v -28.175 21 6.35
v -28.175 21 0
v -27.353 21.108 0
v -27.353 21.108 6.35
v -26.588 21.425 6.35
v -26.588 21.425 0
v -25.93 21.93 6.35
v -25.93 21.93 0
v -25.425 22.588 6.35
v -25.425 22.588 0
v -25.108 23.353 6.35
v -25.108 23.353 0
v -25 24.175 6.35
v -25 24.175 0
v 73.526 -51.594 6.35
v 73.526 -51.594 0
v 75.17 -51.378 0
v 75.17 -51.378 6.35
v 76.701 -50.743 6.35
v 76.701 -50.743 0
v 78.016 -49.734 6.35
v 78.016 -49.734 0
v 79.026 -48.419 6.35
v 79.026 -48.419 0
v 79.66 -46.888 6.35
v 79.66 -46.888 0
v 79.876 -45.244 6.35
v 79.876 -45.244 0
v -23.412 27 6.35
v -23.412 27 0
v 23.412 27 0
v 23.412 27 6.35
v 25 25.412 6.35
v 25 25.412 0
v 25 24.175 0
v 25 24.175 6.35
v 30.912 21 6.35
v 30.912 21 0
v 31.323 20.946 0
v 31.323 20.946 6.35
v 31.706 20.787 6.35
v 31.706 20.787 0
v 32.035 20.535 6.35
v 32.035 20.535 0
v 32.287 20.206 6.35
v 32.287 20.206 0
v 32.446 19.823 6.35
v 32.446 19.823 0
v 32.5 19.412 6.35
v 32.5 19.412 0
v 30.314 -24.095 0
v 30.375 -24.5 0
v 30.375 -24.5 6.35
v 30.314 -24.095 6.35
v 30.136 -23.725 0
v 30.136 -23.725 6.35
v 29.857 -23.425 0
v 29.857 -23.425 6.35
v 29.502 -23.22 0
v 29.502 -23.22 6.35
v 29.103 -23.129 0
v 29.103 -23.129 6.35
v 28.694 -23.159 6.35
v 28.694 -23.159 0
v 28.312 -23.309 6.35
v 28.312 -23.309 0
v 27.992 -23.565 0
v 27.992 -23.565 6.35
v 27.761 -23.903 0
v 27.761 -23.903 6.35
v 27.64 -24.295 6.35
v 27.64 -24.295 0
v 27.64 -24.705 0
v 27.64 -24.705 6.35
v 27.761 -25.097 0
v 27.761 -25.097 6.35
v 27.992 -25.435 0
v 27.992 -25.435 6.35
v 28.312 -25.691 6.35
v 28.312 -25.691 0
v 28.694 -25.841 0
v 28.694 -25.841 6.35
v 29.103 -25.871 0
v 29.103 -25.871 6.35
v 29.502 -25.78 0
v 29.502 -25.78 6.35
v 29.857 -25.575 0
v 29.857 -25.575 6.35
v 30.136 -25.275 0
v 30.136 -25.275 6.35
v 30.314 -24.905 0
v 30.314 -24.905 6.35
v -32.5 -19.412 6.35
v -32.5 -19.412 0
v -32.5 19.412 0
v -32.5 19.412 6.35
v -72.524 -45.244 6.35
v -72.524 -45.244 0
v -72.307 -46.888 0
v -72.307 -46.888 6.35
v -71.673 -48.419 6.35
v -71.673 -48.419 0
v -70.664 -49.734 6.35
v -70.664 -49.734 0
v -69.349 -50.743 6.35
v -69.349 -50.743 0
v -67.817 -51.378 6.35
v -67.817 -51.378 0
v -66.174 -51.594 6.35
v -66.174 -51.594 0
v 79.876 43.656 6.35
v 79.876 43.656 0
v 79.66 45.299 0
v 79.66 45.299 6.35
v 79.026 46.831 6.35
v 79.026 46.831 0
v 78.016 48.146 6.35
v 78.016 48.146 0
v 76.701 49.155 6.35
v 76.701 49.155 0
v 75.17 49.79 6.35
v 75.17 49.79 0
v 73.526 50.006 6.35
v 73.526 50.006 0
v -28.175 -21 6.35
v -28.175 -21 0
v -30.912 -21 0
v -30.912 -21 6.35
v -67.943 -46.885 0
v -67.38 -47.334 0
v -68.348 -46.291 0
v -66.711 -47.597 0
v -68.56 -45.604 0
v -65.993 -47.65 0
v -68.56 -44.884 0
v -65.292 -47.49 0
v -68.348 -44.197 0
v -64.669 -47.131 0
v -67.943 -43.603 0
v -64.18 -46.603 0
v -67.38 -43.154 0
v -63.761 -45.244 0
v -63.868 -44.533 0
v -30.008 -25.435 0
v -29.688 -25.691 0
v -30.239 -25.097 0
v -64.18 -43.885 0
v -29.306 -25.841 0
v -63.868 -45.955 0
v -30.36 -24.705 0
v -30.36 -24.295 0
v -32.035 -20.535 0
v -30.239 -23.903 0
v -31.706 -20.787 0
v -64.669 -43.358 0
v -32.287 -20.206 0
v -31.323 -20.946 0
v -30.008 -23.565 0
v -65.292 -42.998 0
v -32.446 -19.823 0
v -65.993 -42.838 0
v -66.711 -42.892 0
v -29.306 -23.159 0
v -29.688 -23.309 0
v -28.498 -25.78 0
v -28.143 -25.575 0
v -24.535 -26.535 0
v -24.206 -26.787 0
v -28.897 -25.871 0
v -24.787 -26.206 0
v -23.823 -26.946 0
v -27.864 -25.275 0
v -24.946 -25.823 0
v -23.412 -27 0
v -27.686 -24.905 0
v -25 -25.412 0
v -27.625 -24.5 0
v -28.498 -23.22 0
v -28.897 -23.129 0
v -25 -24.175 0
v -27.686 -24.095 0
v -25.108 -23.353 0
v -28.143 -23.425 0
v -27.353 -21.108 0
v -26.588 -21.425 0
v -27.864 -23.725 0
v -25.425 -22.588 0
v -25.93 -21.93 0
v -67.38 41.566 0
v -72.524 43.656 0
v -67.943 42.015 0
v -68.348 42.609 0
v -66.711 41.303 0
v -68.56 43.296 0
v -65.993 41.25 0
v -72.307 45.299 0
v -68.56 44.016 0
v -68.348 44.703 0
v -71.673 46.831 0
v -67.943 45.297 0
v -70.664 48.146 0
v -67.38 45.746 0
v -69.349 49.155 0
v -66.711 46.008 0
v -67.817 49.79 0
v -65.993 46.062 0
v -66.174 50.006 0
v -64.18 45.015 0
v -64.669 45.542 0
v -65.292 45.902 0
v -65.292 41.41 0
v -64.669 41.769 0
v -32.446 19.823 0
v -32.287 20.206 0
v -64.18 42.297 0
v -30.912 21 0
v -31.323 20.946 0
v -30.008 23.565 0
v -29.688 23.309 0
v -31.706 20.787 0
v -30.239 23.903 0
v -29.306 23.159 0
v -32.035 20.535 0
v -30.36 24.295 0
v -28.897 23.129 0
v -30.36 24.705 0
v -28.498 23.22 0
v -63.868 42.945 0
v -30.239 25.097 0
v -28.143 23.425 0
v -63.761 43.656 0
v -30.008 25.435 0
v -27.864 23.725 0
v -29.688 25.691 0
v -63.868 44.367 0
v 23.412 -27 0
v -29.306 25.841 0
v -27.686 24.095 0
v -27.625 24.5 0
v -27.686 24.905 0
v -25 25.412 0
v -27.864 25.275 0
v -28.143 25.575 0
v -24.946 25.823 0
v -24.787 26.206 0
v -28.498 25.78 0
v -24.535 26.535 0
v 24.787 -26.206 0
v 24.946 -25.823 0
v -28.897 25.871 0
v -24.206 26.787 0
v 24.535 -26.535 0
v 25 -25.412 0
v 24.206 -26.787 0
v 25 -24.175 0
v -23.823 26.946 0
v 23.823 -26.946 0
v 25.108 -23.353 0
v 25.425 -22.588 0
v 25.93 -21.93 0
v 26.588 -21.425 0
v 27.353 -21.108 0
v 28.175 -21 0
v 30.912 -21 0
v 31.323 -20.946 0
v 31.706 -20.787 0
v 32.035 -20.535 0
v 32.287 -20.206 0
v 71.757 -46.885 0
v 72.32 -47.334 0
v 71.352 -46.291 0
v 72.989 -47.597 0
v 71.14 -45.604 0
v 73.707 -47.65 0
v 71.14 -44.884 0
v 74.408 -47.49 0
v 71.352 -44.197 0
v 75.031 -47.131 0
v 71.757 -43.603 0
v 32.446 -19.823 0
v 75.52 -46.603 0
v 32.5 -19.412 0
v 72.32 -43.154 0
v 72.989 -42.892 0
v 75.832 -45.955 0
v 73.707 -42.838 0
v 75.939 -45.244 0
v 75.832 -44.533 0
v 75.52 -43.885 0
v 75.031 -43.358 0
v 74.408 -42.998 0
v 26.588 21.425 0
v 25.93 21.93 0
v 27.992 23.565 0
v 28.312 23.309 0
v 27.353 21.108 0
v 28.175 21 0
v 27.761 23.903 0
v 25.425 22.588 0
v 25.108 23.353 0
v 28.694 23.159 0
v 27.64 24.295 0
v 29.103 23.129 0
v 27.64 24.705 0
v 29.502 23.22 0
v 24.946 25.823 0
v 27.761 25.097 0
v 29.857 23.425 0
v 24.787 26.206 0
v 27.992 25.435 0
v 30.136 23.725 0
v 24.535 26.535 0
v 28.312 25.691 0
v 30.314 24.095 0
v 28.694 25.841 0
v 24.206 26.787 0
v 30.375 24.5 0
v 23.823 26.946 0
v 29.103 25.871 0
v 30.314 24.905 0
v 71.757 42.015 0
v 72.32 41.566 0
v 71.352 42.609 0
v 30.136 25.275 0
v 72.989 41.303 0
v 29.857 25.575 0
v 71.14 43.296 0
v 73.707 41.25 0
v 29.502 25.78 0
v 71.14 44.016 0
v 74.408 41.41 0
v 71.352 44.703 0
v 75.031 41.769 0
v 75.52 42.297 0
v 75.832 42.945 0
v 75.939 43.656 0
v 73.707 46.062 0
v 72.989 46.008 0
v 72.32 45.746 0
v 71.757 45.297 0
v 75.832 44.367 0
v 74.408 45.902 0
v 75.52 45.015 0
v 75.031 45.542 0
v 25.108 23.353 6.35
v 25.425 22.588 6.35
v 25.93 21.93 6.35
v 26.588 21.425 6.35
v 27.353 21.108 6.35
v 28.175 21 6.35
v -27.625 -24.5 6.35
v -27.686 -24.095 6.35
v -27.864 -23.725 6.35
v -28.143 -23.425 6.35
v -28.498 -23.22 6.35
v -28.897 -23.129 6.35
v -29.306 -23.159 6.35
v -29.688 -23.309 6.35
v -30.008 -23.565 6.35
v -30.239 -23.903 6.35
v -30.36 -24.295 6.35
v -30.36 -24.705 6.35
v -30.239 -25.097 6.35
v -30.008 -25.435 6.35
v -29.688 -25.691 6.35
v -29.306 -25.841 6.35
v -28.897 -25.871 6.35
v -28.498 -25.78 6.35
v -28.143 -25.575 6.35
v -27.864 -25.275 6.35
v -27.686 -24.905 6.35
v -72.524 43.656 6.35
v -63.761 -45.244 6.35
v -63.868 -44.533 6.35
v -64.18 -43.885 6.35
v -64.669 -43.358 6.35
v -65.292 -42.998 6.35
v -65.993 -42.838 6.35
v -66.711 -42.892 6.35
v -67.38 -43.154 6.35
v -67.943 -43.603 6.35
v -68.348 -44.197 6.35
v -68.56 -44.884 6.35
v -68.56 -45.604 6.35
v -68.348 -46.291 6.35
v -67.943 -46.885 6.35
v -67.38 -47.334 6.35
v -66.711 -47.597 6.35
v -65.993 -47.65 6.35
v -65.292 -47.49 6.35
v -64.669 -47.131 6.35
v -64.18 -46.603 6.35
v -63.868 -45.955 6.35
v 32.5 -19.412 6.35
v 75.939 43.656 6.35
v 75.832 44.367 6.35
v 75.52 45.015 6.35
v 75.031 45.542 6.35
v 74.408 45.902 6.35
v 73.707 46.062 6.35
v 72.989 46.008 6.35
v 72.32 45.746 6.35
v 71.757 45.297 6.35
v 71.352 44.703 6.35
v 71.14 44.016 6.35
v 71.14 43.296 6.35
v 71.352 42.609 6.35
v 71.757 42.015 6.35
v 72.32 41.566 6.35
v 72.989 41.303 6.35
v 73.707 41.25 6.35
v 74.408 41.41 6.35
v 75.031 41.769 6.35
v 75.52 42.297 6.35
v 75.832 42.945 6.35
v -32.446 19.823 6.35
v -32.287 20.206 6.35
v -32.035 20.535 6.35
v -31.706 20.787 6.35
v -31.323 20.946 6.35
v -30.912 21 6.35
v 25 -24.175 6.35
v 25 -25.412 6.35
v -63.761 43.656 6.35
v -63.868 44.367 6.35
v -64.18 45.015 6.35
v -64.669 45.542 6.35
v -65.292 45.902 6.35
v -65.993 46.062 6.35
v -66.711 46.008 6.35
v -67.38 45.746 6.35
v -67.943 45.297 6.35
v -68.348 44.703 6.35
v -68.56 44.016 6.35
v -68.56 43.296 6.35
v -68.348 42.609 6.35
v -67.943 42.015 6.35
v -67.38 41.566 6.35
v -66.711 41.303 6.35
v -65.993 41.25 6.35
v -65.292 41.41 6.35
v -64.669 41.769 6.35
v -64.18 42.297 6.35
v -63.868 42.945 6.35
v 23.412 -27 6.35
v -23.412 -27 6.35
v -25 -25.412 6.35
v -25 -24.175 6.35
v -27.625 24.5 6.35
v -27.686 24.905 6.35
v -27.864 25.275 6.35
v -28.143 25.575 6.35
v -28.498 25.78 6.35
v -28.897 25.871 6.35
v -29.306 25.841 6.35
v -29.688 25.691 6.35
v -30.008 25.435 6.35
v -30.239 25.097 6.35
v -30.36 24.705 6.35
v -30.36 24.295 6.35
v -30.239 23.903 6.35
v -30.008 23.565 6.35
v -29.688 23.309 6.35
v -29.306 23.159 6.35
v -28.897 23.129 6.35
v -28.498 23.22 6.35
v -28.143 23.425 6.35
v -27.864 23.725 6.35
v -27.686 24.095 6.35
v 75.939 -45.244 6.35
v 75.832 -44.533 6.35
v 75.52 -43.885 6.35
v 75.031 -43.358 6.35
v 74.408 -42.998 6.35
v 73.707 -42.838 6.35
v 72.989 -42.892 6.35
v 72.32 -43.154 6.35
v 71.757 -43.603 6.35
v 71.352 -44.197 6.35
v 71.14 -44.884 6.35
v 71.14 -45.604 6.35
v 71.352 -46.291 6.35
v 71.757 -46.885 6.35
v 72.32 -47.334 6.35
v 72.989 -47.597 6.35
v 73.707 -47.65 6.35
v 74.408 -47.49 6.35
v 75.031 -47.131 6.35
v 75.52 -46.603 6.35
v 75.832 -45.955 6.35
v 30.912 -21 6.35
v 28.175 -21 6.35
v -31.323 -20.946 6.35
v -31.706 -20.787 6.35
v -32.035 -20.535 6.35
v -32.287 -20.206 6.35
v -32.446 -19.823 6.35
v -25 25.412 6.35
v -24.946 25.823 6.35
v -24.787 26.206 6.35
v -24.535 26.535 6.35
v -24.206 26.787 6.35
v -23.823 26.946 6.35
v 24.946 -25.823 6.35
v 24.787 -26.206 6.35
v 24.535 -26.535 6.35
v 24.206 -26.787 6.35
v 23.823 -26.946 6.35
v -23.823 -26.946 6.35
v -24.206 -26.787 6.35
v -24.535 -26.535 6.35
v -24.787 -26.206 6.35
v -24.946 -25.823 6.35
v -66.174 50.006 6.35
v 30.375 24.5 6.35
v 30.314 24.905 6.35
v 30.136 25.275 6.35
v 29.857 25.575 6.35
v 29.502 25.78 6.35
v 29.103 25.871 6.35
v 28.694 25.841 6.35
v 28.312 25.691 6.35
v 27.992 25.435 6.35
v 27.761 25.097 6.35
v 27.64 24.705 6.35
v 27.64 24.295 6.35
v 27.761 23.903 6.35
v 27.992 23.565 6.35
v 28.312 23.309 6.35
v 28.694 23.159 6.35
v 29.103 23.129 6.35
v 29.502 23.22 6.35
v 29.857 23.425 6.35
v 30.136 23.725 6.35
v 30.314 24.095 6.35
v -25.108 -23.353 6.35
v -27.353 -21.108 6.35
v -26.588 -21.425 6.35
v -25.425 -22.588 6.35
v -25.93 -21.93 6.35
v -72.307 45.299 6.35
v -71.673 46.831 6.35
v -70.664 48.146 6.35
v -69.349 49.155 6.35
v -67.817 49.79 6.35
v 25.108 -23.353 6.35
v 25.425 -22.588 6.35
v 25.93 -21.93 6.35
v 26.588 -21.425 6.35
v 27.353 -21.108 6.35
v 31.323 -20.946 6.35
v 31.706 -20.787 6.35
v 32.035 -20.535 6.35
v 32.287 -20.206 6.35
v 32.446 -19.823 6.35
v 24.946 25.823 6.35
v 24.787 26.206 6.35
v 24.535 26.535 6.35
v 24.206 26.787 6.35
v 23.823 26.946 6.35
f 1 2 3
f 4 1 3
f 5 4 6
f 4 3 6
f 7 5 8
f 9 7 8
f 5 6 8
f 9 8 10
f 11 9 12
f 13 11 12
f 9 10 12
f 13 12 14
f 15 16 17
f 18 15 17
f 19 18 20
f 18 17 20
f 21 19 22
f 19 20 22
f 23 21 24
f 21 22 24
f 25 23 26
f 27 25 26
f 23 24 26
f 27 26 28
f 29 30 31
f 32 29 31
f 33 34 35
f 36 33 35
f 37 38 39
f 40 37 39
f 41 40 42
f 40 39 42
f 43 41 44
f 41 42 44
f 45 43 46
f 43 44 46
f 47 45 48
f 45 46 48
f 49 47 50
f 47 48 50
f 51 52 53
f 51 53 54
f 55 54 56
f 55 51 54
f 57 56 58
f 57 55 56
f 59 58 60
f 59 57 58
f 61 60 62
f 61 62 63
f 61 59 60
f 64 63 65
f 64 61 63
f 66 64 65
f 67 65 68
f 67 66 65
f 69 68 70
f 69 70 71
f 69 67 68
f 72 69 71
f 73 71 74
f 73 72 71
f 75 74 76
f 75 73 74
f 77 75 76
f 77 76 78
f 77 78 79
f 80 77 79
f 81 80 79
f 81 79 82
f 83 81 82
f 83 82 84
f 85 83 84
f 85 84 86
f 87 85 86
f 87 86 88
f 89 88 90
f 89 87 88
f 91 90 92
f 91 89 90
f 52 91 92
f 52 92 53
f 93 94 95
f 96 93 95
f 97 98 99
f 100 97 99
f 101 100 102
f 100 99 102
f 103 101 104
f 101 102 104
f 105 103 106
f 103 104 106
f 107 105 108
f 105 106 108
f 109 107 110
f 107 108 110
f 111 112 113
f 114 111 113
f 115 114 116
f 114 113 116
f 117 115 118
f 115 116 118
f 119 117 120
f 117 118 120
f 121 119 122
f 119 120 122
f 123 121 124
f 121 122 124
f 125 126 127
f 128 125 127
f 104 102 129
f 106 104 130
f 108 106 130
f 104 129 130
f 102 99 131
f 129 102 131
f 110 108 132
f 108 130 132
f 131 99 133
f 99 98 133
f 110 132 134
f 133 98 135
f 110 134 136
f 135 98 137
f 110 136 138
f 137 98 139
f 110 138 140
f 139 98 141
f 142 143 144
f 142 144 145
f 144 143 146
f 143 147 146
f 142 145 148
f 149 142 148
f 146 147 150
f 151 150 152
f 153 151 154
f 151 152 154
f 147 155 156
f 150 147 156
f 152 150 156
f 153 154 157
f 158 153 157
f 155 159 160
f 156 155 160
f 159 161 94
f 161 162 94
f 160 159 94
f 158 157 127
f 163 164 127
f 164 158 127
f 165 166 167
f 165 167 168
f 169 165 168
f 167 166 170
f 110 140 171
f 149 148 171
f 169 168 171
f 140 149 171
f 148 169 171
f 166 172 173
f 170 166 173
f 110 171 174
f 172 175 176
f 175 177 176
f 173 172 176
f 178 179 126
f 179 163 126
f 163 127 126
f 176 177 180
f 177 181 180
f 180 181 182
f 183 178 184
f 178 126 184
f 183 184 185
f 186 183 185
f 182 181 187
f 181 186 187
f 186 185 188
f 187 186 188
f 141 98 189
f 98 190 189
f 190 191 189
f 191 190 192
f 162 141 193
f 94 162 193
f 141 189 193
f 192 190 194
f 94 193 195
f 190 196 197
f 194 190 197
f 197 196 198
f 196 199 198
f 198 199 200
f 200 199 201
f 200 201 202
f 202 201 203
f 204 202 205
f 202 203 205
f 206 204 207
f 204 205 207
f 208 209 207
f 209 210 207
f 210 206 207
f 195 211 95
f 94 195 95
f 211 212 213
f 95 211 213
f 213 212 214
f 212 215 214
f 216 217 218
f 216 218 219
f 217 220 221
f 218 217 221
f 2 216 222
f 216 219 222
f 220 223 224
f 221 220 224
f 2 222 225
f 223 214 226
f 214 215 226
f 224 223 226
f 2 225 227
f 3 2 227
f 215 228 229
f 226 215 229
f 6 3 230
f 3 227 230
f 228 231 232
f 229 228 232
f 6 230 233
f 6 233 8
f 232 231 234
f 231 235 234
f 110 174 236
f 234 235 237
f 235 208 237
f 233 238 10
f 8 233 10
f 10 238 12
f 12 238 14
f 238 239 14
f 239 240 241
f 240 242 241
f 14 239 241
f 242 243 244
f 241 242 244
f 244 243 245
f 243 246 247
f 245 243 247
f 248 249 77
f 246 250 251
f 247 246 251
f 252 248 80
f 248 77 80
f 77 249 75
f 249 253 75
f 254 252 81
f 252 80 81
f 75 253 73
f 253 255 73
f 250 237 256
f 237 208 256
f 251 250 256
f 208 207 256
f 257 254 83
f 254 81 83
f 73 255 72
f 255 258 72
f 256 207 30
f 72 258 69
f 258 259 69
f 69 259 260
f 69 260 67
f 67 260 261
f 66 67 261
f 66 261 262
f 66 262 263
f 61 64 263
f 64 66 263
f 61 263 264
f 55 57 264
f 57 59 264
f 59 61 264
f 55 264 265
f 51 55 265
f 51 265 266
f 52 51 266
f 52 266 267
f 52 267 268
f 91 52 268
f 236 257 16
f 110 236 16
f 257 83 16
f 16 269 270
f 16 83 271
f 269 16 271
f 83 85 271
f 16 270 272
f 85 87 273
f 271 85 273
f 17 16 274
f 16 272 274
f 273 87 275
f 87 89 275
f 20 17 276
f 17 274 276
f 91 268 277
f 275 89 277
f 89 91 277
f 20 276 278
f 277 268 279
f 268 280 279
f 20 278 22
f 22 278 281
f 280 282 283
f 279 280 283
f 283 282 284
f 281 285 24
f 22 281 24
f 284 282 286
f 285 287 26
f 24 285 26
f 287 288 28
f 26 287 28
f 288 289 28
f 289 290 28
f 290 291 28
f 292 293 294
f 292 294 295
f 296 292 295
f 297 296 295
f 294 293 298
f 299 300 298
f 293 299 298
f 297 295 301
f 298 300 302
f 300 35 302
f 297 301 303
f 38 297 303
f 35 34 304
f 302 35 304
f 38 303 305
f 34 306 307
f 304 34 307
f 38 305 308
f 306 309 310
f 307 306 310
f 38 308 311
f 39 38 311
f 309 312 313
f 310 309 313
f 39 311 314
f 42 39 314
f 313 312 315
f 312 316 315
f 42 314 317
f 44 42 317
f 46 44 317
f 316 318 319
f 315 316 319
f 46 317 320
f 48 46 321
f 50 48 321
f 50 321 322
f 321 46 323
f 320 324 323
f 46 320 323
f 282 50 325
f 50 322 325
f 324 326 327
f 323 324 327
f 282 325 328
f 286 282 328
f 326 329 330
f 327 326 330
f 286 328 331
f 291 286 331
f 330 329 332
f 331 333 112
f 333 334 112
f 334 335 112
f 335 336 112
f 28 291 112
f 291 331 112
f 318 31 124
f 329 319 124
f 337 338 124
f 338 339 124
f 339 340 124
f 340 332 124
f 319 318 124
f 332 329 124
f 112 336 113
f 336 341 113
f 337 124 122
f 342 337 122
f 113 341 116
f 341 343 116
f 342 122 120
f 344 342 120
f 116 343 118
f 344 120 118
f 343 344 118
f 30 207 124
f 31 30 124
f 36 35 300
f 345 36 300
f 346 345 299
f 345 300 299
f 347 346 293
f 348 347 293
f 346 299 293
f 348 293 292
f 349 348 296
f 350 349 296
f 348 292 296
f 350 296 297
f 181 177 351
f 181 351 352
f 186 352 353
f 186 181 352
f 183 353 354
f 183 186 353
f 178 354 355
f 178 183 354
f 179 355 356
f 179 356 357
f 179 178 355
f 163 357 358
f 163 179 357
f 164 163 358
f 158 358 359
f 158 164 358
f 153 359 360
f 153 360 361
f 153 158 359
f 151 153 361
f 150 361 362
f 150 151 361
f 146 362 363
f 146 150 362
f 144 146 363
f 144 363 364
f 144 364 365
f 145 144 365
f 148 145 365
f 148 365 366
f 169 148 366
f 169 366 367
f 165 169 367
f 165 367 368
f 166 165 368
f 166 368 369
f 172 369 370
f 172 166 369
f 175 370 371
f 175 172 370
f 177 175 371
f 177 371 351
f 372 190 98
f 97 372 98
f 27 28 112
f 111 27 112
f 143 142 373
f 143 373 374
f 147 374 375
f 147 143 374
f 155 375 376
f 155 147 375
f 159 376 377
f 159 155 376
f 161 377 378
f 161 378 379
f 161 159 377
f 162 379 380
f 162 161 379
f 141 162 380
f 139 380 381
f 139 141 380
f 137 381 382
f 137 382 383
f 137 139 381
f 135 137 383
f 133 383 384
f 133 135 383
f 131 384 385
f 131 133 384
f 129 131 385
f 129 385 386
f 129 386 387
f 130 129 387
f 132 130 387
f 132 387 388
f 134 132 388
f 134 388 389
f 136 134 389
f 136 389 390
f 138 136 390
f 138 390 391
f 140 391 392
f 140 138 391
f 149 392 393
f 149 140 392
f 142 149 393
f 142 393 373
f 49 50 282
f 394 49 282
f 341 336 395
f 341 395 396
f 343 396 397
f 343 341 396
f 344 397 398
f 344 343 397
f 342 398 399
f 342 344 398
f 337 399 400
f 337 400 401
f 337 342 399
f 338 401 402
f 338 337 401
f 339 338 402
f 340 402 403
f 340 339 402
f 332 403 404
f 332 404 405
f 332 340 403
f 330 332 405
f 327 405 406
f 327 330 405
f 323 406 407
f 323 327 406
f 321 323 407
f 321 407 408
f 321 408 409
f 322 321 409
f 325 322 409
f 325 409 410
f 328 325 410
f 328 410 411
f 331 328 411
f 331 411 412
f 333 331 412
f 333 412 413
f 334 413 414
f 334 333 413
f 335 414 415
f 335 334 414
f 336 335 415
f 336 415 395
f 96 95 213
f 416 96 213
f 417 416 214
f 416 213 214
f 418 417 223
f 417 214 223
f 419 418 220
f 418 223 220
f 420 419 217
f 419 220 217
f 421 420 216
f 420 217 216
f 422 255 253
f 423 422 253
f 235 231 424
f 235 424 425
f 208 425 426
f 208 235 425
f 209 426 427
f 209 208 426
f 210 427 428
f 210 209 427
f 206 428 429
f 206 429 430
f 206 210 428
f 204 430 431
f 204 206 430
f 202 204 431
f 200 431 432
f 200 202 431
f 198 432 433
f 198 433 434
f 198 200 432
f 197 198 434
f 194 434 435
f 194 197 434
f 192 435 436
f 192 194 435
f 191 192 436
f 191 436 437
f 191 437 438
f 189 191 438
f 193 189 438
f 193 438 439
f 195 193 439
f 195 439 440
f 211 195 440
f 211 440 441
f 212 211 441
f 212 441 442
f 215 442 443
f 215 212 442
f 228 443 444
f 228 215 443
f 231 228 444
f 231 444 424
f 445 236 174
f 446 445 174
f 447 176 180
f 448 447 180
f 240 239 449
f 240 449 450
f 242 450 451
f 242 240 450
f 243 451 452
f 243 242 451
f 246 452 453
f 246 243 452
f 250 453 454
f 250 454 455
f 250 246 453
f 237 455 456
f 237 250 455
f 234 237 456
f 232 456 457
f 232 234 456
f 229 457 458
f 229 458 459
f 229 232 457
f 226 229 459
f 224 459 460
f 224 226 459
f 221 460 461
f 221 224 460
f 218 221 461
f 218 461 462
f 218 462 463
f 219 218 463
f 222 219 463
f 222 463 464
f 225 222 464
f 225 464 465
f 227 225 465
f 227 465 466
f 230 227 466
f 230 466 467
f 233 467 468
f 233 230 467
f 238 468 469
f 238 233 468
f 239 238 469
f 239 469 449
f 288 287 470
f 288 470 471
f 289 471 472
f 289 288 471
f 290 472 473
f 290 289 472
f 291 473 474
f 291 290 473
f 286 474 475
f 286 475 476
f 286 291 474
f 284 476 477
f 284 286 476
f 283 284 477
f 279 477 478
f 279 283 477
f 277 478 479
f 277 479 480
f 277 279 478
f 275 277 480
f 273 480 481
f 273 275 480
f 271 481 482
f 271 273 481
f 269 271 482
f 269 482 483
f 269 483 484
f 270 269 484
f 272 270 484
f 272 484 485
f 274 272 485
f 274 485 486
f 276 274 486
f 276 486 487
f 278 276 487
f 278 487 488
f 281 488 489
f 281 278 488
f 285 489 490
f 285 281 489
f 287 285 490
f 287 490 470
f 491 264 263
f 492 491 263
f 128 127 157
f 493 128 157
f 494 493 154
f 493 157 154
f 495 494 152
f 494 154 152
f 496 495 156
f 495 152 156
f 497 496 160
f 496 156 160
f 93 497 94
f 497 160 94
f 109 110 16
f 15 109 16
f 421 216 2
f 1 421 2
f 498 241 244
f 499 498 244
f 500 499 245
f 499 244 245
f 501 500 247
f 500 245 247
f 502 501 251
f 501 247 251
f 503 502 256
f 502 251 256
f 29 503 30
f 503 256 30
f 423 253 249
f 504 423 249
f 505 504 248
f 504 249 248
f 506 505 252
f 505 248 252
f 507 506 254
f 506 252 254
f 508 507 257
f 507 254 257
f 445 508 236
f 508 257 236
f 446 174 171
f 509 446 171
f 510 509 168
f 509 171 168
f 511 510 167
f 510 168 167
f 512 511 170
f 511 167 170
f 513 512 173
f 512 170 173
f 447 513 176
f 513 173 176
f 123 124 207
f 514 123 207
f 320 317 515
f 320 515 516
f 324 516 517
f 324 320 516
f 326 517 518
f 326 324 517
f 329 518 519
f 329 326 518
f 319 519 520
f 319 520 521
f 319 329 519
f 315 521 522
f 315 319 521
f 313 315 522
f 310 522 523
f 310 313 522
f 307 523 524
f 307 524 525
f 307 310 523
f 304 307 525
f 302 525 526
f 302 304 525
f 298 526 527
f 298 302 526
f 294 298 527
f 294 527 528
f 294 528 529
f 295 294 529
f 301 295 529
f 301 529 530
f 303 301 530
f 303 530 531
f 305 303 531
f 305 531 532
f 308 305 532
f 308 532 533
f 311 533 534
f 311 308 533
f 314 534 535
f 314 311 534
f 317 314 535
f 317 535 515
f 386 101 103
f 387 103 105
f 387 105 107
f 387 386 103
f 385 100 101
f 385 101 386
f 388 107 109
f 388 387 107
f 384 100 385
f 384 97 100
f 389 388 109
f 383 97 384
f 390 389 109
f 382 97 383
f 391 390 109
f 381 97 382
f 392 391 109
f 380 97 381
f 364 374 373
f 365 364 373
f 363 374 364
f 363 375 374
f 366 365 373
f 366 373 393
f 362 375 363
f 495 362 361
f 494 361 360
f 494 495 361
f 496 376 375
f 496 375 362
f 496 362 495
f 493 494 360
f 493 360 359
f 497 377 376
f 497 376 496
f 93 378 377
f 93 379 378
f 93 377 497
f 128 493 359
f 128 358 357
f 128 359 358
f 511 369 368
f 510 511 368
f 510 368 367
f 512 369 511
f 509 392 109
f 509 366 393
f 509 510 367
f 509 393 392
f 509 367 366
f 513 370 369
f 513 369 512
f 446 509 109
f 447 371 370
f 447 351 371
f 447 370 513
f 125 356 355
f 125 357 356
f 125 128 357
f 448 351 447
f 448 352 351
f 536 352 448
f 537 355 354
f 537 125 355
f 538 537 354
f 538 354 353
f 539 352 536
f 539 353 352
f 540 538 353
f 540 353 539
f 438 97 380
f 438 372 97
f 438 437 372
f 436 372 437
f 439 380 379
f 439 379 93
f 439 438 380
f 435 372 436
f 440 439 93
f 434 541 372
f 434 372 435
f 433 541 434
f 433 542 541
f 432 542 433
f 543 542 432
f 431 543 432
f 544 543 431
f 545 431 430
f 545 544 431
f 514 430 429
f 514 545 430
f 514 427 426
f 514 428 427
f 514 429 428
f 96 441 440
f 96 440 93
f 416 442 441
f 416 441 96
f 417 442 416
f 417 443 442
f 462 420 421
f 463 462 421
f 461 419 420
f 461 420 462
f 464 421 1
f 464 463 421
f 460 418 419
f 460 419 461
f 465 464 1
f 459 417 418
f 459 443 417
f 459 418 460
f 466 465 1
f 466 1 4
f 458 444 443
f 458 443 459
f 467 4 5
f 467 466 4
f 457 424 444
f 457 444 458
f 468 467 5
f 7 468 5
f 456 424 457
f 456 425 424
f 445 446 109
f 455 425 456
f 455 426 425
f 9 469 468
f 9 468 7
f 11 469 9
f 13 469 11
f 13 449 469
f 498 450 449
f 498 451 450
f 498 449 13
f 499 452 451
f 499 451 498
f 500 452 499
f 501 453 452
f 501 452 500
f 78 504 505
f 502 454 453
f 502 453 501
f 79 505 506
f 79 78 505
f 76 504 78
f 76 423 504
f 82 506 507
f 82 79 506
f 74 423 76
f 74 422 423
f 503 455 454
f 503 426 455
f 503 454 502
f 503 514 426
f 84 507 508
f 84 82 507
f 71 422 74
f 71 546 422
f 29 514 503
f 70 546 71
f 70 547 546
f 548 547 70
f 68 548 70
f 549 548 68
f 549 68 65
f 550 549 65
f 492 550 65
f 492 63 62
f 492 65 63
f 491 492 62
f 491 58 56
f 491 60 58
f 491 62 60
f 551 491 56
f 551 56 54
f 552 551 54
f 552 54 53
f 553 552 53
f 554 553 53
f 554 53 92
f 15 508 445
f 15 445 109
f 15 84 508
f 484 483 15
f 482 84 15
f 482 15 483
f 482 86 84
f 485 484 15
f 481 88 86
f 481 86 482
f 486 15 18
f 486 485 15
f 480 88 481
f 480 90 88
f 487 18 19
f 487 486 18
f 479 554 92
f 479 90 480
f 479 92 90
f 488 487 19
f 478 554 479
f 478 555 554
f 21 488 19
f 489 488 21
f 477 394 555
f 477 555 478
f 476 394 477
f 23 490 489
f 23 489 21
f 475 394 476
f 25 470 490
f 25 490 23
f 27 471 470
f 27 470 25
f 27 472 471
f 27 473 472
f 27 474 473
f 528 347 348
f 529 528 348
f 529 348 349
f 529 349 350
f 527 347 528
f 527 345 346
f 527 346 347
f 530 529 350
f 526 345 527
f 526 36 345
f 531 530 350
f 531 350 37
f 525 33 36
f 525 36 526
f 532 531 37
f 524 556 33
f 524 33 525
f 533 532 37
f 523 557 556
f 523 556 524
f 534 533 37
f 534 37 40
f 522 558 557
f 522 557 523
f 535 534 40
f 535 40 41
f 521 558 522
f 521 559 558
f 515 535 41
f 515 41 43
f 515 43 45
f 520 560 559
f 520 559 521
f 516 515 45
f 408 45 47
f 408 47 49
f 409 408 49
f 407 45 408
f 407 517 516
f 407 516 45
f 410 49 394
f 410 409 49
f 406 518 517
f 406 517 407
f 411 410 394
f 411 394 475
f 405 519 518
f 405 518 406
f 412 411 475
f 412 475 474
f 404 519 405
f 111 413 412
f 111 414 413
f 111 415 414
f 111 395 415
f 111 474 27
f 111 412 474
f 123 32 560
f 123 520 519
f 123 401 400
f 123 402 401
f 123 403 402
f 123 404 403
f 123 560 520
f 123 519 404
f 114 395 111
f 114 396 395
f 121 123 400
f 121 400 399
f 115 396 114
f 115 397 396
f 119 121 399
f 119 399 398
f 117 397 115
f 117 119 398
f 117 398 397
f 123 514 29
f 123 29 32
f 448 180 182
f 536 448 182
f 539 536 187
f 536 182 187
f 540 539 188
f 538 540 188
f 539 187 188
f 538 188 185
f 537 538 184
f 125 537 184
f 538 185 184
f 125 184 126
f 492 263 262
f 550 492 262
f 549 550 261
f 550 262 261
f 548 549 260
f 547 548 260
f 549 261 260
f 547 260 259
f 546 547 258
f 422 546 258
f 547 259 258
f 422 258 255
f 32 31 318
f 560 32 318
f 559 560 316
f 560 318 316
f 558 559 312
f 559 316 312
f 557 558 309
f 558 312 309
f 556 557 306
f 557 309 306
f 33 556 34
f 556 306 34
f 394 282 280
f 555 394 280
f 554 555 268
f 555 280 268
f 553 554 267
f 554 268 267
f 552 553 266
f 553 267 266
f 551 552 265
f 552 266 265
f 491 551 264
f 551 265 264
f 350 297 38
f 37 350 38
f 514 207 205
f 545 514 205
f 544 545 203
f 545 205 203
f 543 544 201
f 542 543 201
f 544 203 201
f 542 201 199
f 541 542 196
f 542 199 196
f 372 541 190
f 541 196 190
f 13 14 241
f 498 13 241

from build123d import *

# Parameters (mm, degrees)
F0_R     = 2.413
F0_R_2   = 1.375
F1_DEPTH = 6.35


with BuildPart() as f1:
    # F0 (on Top) → F1 (new body)
    with BuildSketch(Plane.XY):
        with BuildLine():
            ThreePointArc((-72.523684, -45.244084), (-70.663812, -49.734212), (-66.173684, -51.594084))
            Line((-66.173684, -51.594084), (73.526316, -51.594084))
            ThreePointArc((73.526316, -51.594084), (78.016444, -49.734212), (79.876316, -45.244084))
            Line((79.876316, -45.244084), (79.876316, 43.655916))
            ThreePointArc((79.876316, 43.655916), (78.016444, 48.146044), (73.526316, 50.005916))
            Line((73.526316, 50.005916), (-66.173684, 50.005916))
            ThreePointArc((-66.173684, 50.005916), (-70.663812, 48.146044), (-72.523684, 43.655916))
            Line((-72.523684, 43.655916), (-72.523684, -45.244084))
        make_face()
        with Locations((-66.173684, -45.244084)):
            Circle(F0_R, mode=Mode.SUBTRACT)
        with Locations((-29, -24.5)):
            Circle(F0_R_2, mode=Mode.SUBTRACT)
        with Locations((73.526316, -45.244084)):
            Circle(F0_R, mode=Mode.SUBTRACT)
        with Locations((29, -24.5)):
            Circle(F0_R_2, mode=Mode.SUBTRACT)
        with BuildLine():
            ThreePointArc((-32.5, 19.4125), (-32.035032, 20.535032), (-30.9125, 21))
            Line((-30.9125, 21), (-28.175, 21))
            ThreePointArc((-28.175, 21), (-25.929936, 21.929936), (-25, 24.175))
            Line((-25, 24.175), (-25, 25.4125))
            ThreePointArc((-25, 25.4125), (-24.535032, 26.535032), (-23.4125, 27))
            Line((-23.4125, 27), (23.4125, 27))
            ThreePointArc((23.4125, 27), (24.535032, 26.535032), (25, 25.4125))
            Line((25, 25.4125), (25, 24.175))
            ThreePointArc((25, 24.175), (25.929936, 21.929936), (28.175, 21))
            Line((28.175, 21), (30.9125, 21))
            ThreePointArc((30.9125, 21), (32.035032, 20.535032), (32.5, 19.4125))
            Line((32.5, 19.4125), (32.5, -19.4125))
            ThreePointArc((32.5, -19.4125), (32.035032, -20.535032), (30.9125, -21))
            Line((30.9125, -21), (28.175, -21))
            ThreePointArc((28.175, -21), (25.929936, -21.929936), (25, -24.175))
            Line((25, -24.175), (25, -25.4125))
            ThreePointArc((25, -25.4125), (24.535032, -26.535032), (23.4125, -27))
            Line((23.4125, -27), (-23.4125, -27))
            ThreePointArc((-23.4125, -27), (-24.535032, -26.535032), (-25, -25.4125))
            Line((-25, -25.4125), (-25, -24.175))
            ThreePointArc((-25, -24.175), (-25.929936, -21.929936), (-28.175, -21))
            Line((-28.175, -21), (-30.9125, -21))
            ThreePointArc((-30.9125, -21), (-32.035032, -20.535032), (-32.5, -19.4125))
            Line((-32.5, -19.4125), (-32.5, 19.4125))
        make_face(mode=Mode.SUBTRACT)
        with Locations((-29, 24.5)):
            Circle(F0_R_2, mode=Mode.SUBTRACT)
        with Locations((-66.173684, 43.655916)):
            Circle(F0_R, mode=Mode.SUBTRACT)
        with Locations((29, 24.5)):
            Circle(F0_R_2, mode=Mode.SUBTRACT)
        with Locations((73.526316, 43.655916)):
            Circle(F0_R, mode=Mode.SUBTRACT)
    extrude(amount=F1_DEPTH)


solid = f1.part
